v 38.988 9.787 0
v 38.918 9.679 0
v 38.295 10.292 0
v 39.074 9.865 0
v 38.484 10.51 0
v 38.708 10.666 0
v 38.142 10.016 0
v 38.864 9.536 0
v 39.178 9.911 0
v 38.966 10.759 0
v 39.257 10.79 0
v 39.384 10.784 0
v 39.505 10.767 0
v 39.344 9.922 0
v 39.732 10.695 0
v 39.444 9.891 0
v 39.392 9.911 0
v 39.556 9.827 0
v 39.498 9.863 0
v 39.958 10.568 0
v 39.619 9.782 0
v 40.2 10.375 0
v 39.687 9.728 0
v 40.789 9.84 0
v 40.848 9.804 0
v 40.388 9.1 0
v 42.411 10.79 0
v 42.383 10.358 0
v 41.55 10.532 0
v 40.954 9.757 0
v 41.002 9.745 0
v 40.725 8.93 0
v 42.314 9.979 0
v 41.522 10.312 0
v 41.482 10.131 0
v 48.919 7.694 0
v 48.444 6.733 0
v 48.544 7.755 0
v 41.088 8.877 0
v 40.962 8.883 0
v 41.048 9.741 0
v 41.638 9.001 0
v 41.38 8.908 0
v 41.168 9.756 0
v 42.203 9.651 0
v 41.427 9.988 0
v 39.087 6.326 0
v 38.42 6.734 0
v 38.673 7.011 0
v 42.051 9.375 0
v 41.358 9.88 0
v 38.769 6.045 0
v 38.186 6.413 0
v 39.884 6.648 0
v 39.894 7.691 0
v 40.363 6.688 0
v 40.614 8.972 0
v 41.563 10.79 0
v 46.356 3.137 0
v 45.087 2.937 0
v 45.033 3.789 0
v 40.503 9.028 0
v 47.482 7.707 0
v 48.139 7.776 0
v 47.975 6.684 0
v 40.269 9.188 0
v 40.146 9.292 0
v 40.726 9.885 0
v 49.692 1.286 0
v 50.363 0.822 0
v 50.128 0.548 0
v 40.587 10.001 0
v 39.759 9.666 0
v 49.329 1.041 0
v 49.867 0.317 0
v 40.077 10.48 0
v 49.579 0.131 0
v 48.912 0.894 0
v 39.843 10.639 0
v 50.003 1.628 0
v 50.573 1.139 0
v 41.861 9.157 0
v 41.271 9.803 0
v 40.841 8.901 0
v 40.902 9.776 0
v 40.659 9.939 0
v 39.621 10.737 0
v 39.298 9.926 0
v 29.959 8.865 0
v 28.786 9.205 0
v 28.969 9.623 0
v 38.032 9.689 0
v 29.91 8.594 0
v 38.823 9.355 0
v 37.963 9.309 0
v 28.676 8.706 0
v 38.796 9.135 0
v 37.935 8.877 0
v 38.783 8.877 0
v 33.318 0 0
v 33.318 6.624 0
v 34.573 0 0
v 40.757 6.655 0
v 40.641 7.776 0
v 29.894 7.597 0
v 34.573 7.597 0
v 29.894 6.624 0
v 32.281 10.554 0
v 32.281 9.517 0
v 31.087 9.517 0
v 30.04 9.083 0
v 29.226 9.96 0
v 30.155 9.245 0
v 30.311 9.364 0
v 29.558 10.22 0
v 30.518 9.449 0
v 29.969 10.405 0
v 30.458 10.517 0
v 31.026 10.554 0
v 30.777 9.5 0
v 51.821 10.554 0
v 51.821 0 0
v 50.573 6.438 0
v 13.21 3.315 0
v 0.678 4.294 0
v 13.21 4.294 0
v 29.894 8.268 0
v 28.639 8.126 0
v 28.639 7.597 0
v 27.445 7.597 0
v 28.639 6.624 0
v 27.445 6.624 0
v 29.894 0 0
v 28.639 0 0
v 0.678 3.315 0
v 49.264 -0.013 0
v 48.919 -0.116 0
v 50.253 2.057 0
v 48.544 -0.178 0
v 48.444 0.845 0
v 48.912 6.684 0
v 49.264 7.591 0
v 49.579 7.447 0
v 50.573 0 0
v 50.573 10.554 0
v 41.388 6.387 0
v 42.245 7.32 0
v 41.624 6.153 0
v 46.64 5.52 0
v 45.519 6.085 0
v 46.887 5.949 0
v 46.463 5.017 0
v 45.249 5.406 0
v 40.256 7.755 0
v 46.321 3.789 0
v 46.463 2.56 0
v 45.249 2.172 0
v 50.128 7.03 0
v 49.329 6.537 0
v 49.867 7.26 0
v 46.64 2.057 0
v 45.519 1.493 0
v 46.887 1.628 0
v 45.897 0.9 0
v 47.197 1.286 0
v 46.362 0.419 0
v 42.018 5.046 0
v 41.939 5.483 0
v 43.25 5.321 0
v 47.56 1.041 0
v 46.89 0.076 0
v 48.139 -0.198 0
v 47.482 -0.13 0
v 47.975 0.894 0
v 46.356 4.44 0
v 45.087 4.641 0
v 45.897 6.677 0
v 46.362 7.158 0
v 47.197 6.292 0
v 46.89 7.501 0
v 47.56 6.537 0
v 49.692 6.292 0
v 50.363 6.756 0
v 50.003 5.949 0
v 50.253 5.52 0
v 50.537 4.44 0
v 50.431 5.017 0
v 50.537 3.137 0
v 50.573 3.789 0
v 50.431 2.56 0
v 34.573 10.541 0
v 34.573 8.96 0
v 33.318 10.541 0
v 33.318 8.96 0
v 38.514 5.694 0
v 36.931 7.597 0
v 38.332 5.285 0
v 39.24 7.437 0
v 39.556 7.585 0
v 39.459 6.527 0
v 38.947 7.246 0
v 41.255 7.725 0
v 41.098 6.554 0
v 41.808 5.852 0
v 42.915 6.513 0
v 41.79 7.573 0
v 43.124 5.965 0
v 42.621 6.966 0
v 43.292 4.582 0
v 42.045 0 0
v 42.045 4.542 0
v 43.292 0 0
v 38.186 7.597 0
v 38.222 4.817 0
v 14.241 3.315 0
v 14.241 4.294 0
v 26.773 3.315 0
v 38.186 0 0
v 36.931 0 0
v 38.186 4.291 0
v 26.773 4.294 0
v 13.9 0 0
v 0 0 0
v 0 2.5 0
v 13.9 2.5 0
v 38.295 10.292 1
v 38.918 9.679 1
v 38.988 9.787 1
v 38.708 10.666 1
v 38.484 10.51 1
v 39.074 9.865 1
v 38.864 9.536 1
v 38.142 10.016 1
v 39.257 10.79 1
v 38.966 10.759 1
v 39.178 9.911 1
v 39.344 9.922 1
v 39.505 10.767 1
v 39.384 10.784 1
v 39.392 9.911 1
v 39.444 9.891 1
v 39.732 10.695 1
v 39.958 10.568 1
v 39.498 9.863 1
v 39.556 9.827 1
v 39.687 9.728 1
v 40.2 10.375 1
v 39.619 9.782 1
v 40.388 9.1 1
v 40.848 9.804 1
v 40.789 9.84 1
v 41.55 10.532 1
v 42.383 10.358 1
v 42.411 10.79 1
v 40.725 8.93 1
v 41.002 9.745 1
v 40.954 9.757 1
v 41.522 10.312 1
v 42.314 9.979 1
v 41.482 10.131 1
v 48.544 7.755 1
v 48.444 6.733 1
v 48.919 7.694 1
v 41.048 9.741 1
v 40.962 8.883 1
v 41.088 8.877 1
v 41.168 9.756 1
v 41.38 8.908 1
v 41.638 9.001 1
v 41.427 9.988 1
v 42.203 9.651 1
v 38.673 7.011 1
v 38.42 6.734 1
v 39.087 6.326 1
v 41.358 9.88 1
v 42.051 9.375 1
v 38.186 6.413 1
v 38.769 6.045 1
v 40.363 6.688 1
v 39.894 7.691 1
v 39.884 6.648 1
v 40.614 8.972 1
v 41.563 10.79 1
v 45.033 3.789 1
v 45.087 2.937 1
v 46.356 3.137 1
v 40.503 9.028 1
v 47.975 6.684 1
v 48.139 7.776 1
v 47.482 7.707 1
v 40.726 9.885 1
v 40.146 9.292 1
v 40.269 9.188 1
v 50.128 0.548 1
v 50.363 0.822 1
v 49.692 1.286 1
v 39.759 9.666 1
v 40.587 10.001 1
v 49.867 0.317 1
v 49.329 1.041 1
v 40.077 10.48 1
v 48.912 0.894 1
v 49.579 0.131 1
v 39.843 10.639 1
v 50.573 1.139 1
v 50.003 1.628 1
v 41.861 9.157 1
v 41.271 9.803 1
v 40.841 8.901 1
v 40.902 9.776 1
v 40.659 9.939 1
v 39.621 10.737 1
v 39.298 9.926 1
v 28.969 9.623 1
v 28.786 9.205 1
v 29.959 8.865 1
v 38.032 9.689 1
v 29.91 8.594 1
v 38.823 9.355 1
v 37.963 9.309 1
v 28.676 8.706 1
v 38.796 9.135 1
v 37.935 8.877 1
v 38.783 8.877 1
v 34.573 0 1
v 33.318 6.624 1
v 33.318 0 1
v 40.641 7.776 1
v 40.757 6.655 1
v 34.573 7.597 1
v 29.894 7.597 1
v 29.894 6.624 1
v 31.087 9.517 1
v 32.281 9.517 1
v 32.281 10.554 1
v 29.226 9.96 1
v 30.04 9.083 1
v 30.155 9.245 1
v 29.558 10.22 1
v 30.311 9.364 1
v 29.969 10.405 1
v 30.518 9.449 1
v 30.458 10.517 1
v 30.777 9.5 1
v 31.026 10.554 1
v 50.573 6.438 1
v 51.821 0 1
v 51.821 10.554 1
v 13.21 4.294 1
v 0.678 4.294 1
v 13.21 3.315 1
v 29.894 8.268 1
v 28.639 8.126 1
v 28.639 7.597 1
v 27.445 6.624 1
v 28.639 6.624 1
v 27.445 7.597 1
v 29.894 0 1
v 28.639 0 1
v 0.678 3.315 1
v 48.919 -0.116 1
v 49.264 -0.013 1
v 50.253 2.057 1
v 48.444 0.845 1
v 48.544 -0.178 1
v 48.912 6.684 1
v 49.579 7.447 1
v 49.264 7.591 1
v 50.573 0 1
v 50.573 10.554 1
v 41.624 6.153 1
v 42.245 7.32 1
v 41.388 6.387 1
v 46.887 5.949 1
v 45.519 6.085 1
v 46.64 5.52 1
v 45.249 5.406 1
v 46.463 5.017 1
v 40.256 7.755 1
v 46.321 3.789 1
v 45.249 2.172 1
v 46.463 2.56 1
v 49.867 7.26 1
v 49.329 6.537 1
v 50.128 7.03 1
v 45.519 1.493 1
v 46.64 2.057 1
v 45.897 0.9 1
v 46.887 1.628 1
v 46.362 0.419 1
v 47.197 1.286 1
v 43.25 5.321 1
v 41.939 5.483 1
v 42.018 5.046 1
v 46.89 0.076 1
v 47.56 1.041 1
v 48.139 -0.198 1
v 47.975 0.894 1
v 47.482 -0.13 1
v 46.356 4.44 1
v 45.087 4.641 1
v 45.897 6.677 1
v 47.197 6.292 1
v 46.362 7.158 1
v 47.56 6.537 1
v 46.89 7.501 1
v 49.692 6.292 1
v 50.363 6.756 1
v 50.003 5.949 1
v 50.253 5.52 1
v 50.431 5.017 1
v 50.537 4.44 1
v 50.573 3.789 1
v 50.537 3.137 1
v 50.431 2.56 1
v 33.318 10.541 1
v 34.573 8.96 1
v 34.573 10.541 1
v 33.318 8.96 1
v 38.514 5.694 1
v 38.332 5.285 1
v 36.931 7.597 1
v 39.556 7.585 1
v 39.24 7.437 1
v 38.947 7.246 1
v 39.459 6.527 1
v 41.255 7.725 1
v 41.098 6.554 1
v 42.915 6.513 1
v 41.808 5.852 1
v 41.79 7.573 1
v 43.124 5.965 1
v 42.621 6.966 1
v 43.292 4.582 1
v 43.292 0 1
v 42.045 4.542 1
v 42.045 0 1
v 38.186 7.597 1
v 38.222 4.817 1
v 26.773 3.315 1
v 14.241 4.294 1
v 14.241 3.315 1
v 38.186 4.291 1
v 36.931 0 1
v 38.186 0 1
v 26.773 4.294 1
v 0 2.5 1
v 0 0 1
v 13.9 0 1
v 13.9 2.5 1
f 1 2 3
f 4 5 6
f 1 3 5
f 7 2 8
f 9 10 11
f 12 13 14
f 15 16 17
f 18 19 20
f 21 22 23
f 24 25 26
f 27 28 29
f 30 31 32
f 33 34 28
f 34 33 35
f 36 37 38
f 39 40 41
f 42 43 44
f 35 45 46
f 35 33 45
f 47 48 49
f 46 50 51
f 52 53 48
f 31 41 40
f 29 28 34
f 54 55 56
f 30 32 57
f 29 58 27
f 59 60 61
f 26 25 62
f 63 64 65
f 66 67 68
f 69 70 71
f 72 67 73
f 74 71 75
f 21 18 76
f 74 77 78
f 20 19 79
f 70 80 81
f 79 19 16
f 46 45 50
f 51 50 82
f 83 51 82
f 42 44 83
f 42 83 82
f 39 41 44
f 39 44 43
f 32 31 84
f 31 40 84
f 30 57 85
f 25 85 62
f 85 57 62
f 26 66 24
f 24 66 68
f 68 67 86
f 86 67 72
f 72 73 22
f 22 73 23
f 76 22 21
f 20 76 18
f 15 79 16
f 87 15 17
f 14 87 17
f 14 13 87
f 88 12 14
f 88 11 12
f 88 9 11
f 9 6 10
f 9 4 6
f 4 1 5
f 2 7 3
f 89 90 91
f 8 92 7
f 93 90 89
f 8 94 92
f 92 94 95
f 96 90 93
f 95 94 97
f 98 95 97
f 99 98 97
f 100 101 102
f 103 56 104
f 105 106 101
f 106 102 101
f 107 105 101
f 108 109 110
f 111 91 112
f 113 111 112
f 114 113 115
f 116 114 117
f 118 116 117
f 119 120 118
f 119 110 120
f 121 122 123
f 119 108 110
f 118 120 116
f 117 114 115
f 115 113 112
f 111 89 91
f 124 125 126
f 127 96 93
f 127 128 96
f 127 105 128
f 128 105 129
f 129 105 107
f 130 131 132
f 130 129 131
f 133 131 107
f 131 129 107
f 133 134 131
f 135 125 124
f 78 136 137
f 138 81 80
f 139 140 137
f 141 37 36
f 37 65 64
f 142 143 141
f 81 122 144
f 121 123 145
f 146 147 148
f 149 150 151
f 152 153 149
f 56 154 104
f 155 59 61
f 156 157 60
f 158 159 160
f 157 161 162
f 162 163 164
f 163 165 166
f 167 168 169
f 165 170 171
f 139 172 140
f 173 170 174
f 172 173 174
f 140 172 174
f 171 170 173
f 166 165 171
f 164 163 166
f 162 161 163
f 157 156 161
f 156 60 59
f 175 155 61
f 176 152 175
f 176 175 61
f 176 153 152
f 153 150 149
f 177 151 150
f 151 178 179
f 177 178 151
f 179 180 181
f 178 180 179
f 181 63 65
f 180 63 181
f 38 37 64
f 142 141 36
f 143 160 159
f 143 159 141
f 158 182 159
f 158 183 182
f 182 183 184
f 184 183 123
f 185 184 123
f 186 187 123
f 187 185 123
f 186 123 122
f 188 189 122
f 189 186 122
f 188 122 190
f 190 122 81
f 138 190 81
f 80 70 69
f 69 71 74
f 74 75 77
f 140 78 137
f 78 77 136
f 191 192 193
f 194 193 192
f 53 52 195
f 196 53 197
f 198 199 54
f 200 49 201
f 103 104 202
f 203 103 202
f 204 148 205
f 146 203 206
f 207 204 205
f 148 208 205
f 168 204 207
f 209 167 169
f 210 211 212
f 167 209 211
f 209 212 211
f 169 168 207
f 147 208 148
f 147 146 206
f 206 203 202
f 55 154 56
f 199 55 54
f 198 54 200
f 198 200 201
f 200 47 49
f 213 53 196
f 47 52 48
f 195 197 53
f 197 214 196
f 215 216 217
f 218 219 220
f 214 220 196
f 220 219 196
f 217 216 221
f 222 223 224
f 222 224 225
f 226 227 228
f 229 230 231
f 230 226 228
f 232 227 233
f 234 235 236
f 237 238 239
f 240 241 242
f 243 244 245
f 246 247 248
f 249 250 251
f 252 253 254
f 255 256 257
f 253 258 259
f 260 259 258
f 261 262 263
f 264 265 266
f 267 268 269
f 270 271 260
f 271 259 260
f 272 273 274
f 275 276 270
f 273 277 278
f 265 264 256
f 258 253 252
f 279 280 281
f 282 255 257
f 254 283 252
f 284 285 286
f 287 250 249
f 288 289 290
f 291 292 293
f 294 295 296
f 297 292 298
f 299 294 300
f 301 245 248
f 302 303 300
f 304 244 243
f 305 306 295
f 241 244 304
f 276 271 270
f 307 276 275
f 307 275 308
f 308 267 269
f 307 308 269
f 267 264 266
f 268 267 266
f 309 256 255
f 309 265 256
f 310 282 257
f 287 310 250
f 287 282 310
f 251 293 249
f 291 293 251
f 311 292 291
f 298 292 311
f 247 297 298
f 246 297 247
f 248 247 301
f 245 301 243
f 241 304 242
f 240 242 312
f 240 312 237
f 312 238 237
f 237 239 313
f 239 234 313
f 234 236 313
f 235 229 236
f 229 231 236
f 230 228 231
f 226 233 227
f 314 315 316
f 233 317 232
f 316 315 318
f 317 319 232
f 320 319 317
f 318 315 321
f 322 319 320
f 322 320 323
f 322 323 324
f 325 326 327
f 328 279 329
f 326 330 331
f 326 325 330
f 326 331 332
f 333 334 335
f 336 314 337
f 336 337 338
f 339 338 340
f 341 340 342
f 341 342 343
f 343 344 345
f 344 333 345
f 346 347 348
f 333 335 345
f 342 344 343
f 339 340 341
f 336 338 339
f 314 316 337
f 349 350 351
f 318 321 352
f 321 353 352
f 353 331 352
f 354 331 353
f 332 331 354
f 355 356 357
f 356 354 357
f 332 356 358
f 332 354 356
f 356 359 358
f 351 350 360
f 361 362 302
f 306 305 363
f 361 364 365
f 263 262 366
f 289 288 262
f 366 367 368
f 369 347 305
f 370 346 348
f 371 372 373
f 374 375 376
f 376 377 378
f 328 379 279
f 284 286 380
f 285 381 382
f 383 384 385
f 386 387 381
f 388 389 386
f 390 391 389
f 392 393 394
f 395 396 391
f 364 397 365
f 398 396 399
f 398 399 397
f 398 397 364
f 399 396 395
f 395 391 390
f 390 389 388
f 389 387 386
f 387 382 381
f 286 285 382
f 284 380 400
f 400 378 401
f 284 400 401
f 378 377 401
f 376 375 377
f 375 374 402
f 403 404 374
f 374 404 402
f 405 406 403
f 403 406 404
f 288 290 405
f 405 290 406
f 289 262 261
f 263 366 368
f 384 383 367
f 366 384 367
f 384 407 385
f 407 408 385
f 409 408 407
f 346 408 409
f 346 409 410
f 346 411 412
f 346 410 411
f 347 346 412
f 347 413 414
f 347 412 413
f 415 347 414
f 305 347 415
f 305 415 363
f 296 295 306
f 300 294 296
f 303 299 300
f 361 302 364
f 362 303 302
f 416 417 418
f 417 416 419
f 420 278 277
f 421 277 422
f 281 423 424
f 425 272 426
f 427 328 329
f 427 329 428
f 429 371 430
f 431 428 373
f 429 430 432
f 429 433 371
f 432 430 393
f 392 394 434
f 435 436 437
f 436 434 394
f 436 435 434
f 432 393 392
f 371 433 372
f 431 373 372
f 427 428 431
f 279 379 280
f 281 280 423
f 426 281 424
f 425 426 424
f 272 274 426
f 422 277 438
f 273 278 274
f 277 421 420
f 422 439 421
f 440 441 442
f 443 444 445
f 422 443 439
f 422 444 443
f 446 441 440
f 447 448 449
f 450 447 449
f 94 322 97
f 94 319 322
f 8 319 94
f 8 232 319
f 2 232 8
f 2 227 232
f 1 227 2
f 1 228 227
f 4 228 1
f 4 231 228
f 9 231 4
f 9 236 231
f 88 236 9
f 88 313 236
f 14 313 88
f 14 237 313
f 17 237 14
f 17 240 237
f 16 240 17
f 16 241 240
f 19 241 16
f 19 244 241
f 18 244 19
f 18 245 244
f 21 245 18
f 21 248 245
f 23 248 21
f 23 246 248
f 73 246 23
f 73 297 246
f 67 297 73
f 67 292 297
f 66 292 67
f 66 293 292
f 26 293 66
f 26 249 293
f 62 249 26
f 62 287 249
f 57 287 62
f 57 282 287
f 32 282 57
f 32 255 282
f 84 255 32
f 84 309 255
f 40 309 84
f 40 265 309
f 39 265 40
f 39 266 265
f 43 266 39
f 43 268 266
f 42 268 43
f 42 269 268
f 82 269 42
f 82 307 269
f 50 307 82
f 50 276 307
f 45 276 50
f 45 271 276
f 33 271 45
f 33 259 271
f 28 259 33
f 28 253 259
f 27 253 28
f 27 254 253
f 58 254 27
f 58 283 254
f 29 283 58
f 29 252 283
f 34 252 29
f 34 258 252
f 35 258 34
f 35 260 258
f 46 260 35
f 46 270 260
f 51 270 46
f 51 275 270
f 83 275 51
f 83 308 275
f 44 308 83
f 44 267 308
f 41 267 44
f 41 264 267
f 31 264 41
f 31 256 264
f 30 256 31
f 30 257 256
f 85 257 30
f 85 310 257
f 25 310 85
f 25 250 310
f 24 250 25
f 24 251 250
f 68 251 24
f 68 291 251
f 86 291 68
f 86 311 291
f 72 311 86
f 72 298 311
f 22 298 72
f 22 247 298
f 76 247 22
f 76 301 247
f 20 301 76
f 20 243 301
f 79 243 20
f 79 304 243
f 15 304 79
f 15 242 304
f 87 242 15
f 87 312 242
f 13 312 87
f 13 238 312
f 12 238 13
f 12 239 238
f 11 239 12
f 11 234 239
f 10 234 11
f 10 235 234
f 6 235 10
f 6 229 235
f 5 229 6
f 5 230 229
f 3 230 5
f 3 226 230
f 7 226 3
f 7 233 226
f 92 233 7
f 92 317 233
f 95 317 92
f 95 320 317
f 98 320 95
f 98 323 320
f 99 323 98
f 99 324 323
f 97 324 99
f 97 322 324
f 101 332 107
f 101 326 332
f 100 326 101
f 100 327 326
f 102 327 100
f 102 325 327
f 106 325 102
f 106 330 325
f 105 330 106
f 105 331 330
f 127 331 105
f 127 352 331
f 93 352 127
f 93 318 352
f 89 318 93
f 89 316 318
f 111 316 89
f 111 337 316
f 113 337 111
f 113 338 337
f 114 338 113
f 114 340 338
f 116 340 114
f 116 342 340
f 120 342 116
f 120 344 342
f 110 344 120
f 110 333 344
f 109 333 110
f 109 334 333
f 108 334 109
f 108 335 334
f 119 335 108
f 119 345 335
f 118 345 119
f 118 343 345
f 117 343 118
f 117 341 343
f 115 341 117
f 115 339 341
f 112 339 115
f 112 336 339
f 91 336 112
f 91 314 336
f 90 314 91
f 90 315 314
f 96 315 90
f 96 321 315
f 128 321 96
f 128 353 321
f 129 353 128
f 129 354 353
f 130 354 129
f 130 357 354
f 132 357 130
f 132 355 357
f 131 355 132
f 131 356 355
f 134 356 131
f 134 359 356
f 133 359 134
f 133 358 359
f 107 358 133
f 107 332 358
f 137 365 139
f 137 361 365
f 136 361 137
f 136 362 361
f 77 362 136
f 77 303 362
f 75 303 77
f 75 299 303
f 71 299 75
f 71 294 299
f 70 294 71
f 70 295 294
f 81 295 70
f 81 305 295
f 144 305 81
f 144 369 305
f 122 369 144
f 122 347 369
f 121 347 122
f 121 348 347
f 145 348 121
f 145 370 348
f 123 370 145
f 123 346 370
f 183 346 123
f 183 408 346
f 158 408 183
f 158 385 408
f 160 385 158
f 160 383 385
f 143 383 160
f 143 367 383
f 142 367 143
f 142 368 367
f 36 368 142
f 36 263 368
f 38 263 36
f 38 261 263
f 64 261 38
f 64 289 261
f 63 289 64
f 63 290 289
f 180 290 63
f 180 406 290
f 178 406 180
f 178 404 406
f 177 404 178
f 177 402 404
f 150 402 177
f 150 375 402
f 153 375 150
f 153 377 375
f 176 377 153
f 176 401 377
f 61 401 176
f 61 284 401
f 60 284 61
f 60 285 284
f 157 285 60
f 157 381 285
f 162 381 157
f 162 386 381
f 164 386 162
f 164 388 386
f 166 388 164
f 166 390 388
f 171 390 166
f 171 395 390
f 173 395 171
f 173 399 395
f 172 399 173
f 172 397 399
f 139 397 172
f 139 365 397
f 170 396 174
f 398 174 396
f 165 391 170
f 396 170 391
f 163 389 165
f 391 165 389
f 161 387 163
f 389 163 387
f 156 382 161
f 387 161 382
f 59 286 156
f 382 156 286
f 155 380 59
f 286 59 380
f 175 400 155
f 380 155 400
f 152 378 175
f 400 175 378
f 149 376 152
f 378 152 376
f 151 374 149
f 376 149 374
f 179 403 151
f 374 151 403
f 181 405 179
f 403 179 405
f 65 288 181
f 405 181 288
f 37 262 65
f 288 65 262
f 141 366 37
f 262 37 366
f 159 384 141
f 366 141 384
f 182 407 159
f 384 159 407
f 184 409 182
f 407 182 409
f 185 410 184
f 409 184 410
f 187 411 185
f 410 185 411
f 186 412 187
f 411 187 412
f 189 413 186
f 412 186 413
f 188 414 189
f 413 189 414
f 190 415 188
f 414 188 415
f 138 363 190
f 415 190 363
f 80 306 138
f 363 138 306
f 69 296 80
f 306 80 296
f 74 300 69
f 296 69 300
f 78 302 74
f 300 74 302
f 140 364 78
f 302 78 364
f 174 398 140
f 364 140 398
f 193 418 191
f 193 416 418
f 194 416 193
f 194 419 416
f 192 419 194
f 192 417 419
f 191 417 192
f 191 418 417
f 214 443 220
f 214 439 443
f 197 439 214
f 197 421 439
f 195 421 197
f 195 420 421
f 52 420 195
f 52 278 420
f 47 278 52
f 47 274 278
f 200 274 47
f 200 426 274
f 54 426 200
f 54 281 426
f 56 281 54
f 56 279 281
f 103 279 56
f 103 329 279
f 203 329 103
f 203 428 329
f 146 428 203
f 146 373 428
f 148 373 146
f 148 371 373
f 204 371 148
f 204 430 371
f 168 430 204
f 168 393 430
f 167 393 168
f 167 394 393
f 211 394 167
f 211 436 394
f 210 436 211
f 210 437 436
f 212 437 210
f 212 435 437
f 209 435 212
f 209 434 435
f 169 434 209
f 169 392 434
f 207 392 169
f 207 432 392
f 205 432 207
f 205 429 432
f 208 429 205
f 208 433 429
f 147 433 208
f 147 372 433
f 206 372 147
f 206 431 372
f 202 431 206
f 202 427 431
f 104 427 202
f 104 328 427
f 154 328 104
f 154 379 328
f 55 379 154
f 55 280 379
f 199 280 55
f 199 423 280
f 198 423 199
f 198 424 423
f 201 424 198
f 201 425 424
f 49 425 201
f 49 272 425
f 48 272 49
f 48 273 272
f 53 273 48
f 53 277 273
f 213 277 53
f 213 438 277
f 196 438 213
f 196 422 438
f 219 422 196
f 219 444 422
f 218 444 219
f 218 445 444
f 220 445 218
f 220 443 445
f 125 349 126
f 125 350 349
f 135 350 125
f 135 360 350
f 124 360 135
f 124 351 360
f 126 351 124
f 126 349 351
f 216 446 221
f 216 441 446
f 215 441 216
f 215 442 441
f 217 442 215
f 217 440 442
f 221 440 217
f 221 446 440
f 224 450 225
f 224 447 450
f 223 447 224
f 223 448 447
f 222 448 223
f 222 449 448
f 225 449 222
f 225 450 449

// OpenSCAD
linear_extrude(height=1,slices=1) {
    text("\u2014\u2014fin\u0303d", size=10, font="DejaVu Sans:style=Bold Oblique");
    square([13.9,2.5]);
}
